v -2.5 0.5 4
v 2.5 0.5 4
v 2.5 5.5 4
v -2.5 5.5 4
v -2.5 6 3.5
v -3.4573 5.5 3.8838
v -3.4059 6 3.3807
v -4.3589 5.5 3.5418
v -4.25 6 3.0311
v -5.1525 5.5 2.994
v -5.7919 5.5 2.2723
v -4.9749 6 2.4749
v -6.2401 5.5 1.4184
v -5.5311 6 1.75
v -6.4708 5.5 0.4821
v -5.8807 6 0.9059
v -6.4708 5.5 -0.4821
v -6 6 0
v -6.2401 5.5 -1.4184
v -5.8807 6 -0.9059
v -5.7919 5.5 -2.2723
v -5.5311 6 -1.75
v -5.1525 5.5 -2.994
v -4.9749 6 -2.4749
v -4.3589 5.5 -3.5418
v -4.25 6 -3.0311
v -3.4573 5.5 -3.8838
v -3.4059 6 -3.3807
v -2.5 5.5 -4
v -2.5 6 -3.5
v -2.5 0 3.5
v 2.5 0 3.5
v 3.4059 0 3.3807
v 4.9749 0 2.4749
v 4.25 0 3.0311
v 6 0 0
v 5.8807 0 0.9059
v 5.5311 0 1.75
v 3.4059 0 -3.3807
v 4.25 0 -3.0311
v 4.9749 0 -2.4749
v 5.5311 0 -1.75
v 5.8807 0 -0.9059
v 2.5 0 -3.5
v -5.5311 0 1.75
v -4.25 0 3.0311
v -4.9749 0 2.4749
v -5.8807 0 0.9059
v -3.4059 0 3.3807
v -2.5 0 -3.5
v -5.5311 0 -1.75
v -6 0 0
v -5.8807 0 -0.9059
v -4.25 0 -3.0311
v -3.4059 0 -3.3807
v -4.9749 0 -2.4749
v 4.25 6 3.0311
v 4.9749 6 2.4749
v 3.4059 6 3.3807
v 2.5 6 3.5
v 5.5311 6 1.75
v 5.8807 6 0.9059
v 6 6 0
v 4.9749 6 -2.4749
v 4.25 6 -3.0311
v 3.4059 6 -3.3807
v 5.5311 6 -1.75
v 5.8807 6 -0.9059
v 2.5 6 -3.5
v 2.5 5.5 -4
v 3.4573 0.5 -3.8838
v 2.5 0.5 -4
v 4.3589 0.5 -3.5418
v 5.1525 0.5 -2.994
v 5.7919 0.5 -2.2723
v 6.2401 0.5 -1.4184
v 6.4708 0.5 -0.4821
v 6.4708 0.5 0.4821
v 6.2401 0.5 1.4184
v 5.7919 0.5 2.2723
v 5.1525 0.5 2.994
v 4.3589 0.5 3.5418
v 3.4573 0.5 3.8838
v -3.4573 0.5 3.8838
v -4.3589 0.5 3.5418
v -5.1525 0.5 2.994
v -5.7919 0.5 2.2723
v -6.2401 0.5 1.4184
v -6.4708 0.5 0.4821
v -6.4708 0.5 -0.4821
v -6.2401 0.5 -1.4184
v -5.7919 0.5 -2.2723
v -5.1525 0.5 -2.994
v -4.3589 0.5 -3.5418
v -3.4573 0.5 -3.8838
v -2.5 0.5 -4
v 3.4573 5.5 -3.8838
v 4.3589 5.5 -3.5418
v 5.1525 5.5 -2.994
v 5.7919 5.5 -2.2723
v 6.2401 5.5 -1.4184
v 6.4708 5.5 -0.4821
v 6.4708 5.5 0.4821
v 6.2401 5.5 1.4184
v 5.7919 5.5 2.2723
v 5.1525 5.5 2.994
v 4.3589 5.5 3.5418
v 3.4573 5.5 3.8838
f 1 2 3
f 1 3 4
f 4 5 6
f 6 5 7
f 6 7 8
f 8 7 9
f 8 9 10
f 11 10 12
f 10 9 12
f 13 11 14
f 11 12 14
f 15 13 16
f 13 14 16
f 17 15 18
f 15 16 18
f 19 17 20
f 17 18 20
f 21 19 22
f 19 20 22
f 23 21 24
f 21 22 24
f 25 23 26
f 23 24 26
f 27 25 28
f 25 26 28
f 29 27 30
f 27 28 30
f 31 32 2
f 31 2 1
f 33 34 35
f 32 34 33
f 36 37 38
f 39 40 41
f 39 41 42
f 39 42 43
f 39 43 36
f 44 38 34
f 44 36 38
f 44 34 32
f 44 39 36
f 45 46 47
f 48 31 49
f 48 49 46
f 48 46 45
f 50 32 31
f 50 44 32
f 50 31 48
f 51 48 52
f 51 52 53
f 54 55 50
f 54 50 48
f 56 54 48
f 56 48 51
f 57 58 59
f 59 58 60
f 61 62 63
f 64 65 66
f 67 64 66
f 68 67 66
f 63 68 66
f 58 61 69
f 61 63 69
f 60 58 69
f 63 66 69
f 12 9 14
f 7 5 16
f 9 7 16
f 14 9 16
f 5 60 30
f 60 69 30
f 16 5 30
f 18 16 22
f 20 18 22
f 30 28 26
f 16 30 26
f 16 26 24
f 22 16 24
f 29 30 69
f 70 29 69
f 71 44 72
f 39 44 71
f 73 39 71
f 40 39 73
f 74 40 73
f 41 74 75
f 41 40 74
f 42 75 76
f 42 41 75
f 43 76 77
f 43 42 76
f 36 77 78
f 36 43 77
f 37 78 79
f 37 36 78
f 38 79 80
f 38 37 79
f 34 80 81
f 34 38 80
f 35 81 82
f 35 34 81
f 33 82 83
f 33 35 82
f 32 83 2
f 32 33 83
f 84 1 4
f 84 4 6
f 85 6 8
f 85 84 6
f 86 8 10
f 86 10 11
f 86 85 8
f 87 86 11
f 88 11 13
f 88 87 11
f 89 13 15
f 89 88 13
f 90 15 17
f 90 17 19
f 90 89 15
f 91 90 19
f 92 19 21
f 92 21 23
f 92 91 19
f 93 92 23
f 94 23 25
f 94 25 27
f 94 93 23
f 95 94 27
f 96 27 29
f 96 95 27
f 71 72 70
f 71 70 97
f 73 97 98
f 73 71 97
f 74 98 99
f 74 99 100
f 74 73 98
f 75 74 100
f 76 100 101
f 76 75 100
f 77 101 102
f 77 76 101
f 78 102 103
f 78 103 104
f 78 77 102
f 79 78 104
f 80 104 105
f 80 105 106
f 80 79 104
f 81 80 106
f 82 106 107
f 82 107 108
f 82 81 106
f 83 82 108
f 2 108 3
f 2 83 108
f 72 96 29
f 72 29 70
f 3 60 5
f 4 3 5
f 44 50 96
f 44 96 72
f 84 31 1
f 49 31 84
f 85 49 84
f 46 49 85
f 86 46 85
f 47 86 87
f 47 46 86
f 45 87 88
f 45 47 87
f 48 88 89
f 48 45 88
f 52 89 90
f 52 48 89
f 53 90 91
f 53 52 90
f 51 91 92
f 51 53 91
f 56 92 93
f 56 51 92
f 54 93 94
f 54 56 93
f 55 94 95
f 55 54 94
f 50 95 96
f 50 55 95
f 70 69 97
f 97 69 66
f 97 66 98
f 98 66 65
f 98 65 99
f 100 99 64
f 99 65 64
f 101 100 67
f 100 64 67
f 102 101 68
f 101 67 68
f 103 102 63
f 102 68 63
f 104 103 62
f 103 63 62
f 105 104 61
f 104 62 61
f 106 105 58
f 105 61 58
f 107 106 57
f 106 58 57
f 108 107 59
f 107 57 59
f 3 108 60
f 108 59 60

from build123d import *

# Parameters (mm, degrees)
ESTRUSIONE_ESTRUSIONE1_DEPTH = 6
SMUSSO1_SIZE                 = 0.5


with BuildPart() as part:
    # Schizzo1 → Estrusione-Estrusione1 (new body)
    with BuildSketch(Plane(origin=(0, 0, 0), x_dir=(1, 0, 0), z_dir=(0, 1, 0))):
        with BuildLine():
            Line((-2.5, 4), (2.5, 4))
            ThreePointArc((2.5, 4), (6.5, 0), (2.5, -4))
            Line((2.5, -4), (-2.5, -4))
            ThreePointArc((-2.5, -4), (-6.5, 0), (-2.5, 4))
        make_face()
    extrude(amount=ESTRUSIONE_ESTRUSIONE1_DEPTH)

    # Smusso1
    smusso1_edges = [part.edges().sort_by_distance(p)[0] for p in [
        (6.5, 6, 0),
        (0, 6, -4),
        (-6.5, 6, 0),
        (0, 0, -4),
        (6.5, 0, 0),
        (0, 0, 4),
        (-6.5, 0, 0),
        (0, 6, 4),
    ]]
    chamfer(smusso1_edges, length=SMUSSO1_SIZE)


solid = part.part
